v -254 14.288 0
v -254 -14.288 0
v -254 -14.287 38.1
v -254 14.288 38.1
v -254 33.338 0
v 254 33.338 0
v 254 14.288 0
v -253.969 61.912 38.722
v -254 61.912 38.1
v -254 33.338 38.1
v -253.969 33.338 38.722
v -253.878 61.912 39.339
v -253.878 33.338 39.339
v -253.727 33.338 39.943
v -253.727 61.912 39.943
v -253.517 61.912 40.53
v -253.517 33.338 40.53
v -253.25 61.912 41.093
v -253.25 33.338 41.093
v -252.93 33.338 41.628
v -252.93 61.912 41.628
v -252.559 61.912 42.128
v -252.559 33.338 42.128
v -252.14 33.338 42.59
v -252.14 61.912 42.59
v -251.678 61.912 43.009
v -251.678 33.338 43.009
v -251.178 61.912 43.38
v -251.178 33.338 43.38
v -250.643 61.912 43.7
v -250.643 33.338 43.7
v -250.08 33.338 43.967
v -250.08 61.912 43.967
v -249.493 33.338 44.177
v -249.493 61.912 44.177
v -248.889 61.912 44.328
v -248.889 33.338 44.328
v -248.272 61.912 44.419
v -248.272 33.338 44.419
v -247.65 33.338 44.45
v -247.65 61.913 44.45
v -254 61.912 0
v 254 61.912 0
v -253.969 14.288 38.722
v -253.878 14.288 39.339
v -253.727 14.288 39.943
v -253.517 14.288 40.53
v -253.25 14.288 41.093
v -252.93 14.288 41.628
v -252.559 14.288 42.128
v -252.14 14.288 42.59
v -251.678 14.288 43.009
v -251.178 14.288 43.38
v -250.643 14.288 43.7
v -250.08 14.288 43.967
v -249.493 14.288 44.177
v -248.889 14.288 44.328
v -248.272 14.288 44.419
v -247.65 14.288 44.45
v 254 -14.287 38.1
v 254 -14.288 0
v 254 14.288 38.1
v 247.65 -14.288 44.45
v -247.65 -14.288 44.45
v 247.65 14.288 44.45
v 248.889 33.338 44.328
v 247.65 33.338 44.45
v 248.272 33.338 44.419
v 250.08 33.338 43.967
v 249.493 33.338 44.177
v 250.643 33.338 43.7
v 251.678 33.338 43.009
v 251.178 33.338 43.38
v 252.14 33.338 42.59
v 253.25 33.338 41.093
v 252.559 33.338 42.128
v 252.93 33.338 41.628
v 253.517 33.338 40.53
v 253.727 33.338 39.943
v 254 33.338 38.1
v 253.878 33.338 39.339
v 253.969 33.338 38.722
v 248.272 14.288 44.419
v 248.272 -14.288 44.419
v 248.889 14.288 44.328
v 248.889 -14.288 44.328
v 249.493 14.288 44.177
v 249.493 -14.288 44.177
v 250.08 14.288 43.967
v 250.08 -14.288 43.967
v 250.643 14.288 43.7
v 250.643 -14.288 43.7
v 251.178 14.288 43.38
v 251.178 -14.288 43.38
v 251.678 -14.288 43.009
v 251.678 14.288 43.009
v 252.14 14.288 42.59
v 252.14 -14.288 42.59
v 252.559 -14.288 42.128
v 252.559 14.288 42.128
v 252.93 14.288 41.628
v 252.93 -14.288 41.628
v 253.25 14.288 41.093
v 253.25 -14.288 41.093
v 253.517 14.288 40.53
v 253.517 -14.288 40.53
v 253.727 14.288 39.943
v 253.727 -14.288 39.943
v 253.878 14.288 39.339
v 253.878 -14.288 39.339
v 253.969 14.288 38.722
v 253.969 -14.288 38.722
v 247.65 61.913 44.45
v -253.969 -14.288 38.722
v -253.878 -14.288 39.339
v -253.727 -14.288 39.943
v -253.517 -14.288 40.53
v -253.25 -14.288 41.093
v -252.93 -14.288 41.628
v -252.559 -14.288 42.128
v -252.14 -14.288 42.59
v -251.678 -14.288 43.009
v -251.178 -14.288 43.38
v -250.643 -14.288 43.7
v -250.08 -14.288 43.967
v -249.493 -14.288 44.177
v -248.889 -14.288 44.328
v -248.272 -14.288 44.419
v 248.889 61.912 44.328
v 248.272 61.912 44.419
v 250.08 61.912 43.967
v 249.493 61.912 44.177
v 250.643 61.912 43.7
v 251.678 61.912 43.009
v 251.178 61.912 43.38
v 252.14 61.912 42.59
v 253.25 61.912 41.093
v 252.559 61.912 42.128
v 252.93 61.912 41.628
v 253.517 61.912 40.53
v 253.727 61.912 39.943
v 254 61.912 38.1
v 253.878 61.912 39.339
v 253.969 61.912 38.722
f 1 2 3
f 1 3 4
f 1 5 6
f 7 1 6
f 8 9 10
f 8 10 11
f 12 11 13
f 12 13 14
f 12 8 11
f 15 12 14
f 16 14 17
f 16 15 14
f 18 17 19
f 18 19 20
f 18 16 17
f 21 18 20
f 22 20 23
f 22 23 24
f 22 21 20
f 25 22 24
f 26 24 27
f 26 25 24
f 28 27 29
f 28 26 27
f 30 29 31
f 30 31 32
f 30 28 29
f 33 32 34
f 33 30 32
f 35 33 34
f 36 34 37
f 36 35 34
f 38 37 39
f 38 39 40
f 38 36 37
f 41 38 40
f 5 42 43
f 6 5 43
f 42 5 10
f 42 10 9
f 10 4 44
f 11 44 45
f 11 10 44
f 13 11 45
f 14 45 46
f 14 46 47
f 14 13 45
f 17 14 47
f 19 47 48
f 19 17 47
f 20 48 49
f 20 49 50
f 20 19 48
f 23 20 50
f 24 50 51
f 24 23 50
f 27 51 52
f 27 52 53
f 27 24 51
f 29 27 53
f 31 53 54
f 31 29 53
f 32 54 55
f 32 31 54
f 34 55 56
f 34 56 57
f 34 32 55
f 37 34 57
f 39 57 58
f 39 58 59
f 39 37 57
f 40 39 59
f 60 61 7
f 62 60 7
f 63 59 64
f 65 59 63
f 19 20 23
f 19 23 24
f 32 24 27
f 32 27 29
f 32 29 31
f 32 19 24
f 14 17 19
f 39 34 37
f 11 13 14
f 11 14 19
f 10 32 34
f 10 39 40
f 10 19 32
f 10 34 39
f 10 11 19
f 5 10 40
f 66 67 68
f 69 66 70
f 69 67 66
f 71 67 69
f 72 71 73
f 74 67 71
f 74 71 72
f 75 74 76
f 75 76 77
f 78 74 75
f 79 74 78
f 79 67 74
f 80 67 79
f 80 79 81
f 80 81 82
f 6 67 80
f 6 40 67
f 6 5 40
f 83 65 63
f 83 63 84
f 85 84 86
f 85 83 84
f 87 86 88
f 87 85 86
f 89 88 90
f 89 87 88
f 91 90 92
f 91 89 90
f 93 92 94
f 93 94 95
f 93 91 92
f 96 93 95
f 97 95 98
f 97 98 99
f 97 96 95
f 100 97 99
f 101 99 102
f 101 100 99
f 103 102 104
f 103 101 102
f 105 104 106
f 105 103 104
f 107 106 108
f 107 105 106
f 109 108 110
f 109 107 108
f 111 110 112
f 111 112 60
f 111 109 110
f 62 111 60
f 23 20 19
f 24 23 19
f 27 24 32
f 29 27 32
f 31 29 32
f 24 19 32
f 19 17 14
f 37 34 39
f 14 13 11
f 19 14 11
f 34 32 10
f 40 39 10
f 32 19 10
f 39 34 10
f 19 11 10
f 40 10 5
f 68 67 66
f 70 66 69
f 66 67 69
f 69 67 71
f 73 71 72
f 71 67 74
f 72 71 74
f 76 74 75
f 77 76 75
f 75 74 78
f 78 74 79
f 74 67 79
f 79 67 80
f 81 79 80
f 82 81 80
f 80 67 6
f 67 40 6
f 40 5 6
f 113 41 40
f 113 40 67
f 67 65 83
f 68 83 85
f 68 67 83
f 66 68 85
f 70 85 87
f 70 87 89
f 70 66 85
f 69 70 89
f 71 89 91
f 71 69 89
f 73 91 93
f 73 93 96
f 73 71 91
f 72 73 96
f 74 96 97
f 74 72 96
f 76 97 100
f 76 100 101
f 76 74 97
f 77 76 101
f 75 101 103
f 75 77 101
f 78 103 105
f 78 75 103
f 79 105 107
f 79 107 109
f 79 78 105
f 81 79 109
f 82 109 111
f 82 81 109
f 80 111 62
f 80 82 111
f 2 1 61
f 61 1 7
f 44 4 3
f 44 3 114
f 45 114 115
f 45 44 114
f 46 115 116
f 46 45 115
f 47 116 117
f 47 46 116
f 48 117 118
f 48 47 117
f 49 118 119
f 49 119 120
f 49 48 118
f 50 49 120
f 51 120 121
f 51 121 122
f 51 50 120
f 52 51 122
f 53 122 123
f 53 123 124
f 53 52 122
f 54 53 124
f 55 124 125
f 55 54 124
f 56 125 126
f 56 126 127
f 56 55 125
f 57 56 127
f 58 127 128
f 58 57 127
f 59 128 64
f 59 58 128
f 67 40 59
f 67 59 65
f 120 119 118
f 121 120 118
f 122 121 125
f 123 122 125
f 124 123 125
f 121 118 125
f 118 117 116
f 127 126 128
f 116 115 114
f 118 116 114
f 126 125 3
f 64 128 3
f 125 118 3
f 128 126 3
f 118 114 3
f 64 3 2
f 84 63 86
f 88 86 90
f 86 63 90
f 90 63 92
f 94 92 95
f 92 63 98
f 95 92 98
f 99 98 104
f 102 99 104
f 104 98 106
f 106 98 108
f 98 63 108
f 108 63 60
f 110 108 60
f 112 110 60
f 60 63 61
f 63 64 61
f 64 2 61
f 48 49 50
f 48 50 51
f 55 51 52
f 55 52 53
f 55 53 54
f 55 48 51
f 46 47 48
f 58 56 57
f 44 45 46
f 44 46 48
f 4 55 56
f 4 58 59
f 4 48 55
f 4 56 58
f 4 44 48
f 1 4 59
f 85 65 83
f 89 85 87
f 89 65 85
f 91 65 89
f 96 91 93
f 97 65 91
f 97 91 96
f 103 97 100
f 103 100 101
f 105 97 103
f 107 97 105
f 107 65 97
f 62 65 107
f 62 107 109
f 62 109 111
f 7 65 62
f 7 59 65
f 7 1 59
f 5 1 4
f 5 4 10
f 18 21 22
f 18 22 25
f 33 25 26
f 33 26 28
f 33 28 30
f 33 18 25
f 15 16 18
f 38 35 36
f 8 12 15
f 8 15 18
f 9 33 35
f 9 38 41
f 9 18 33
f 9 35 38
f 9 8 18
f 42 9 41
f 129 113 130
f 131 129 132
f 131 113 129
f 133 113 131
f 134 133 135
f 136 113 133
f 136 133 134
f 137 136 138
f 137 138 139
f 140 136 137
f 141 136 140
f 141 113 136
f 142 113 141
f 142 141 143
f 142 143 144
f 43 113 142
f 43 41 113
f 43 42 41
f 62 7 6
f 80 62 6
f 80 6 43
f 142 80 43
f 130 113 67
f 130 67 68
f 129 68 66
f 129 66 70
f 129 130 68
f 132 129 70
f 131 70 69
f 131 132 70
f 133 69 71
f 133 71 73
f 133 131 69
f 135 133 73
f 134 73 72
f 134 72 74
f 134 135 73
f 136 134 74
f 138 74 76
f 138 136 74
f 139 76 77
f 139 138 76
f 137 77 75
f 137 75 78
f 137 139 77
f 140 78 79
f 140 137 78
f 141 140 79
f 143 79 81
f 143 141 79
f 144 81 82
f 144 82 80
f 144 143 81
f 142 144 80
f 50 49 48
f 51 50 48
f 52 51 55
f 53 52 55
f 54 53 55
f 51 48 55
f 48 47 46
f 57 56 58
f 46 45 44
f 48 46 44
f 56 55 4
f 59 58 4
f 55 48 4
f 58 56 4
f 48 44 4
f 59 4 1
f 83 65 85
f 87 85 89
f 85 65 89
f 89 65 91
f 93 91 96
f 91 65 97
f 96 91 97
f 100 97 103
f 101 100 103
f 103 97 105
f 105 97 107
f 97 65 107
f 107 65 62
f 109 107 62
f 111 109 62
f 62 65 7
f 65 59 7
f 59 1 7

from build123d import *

# Parameters (mm, degrees)
F0_W          = 508
F0_H          = 28.575
F1_DEPTH      = 44.45
F2_W          = 508
F2_H          = 19.05
F3_DEPTH      = 44.45
F4_W          = 508
F4_H          = 28.575
F5_DEPTH      = 44.45
F7_DEPTH      = 61.9135
F7_DEPTH_BACK = 14.2885
F8_DEPTH      = 61.9135
F9_DEPTH      = 61.9135


with BuildPart() as f1:
    # F0 (on Top) → F1 (new body)
    with BuildSketch(Plane.XY):
        Rectangle(F0_W, F0_H)
    extrude(amount=F1_DEPTH)


with BuildPart() as f3:
    # F2 (on Top) → F3 (new body, through all)
    with BuildSketch(Plane.XY):
        with Locations((0, 23.8125)):
            Rectangle(F2_W, F2_H)
    extrude(amount=F3_DEPTH)


with BuildPart() as f5:
    # F4 (on Top) → F5 (new body, through all)
    with BuildSketch(Plane.XY):
        with Locations((0, 47.625)):
            Rectangle(F4_W, F4_H)
    extrude(amount=F5_DEPTH)


with BuildPart() as f7_tool:
    # F6 (on Front) → F7 (new body, two sides)
    with BuildSketch(Plane.XZ) as f7_sk:
        with BuildLine():
            ThreePointArc((247.65, 44.45), (252.1401280605, 42.5901280605), (254, 38.1))
            Line((254, 38.1), (254, 44.45))
            Line((254, 44.45), (247.65, 44.45))
        make_face()
        with BuildLine():
            Line((-254, 44.45), (-254, 38.1))
            ThreePointArc((-254, 38.1), (-252.1401280605, 42.5901280605), (-247.65, 44.45))
            Line((-247.65, 44.45), (-254, 44.45))
        make_face()
    extrude(amount=-F7_DEPTH)
    extrude(f7_sk.sketch, amount=F7_DEPTH_BACK)


with BuildPart() as f1_1:
    add(f1.part)

    # F7: cut by f7_tool
    add(f7_tool.part, mode=Mode.SUBTRACT)

    # F6 (on Front) → F8 (cut, through all)
    with BuildSketch(Plane.XZ):
        with BuildLine():
            ThreePointArc((247.65, 44.45), (252.1401280605, 42.5901280605), (254, 38.1))
            Line((254, 38.1), (254, 44.45))
            Line((254, 44.45), (247.65, 44.45))
        make_face()
        with BuildLine():
            Line((-254, 44.45), (-254, 38.1))
            ThreePointArc((-254, 38.1), (-252.1401280605, 42.5901280605), (-247.65, 44.45))
            Line((-247.65, 44.45), (-254, 44.45))
        make_face()
    extrude(amount=-F8_DEPTH, mode=Mode.SUBTRACT)

    # F6 (on Front) → F9 (cut, through all)
    with BuildSketch(Plane.XZ):
        with BuildLine():
            ThreePointArc((247.65, 44.45), (252.1401280605, 42.5901280605), (254, 38.1))
            Line((254, 38.1), (254, 44.45))
            Line((254, 44.45), (247.65, 44.45))
        make_face()
        with BuildLine():
            Line((-254, 44.45), (-254, 38.1))
            ThreePointArc((-254, 38.1), (-252.1401280605, 42.5901280605), (-247.65, 44.45))
            Line((-247.65, 44.45), (-254, 44.45))
        make_face()
    extrude(amount=-F9_DEPTH, mode=Mode.SUBTRACT)


with BuildPart() as f3_1:
    add(f3.part)

    # F7: cut by f7_tool
    add(f7_tool.part, mode=Mode.SUBTRACT)


with BuildPart() as f5_1:
    add(f5.part)

    # F7: cut by f7_tool
    add(f7_tool.part, mode=Mode.SUBTRACT)


solid = Compound([f1_1.part, f3_1.part, f5_1.part])
